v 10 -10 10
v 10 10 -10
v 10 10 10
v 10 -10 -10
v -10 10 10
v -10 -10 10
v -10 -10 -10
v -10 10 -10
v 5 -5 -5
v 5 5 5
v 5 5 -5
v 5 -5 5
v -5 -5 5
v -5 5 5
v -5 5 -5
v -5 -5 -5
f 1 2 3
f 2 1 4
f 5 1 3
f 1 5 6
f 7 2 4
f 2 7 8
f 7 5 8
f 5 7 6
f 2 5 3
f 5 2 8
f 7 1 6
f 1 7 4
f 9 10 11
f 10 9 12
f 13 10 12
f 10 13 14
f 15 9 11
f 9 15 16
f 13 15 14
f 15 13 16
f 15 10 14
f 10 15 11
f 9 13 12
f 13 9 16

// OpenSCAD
// Hollow cube.
// STL export is wrong (inner cube is positive instead of negative)
// This is fixed by applying and using the patch to CGAL containing
// convert_all_inner_shells_to_polyhedron()
difference() {
    cube(20, center = true);
    cube(10, center = true);
}
